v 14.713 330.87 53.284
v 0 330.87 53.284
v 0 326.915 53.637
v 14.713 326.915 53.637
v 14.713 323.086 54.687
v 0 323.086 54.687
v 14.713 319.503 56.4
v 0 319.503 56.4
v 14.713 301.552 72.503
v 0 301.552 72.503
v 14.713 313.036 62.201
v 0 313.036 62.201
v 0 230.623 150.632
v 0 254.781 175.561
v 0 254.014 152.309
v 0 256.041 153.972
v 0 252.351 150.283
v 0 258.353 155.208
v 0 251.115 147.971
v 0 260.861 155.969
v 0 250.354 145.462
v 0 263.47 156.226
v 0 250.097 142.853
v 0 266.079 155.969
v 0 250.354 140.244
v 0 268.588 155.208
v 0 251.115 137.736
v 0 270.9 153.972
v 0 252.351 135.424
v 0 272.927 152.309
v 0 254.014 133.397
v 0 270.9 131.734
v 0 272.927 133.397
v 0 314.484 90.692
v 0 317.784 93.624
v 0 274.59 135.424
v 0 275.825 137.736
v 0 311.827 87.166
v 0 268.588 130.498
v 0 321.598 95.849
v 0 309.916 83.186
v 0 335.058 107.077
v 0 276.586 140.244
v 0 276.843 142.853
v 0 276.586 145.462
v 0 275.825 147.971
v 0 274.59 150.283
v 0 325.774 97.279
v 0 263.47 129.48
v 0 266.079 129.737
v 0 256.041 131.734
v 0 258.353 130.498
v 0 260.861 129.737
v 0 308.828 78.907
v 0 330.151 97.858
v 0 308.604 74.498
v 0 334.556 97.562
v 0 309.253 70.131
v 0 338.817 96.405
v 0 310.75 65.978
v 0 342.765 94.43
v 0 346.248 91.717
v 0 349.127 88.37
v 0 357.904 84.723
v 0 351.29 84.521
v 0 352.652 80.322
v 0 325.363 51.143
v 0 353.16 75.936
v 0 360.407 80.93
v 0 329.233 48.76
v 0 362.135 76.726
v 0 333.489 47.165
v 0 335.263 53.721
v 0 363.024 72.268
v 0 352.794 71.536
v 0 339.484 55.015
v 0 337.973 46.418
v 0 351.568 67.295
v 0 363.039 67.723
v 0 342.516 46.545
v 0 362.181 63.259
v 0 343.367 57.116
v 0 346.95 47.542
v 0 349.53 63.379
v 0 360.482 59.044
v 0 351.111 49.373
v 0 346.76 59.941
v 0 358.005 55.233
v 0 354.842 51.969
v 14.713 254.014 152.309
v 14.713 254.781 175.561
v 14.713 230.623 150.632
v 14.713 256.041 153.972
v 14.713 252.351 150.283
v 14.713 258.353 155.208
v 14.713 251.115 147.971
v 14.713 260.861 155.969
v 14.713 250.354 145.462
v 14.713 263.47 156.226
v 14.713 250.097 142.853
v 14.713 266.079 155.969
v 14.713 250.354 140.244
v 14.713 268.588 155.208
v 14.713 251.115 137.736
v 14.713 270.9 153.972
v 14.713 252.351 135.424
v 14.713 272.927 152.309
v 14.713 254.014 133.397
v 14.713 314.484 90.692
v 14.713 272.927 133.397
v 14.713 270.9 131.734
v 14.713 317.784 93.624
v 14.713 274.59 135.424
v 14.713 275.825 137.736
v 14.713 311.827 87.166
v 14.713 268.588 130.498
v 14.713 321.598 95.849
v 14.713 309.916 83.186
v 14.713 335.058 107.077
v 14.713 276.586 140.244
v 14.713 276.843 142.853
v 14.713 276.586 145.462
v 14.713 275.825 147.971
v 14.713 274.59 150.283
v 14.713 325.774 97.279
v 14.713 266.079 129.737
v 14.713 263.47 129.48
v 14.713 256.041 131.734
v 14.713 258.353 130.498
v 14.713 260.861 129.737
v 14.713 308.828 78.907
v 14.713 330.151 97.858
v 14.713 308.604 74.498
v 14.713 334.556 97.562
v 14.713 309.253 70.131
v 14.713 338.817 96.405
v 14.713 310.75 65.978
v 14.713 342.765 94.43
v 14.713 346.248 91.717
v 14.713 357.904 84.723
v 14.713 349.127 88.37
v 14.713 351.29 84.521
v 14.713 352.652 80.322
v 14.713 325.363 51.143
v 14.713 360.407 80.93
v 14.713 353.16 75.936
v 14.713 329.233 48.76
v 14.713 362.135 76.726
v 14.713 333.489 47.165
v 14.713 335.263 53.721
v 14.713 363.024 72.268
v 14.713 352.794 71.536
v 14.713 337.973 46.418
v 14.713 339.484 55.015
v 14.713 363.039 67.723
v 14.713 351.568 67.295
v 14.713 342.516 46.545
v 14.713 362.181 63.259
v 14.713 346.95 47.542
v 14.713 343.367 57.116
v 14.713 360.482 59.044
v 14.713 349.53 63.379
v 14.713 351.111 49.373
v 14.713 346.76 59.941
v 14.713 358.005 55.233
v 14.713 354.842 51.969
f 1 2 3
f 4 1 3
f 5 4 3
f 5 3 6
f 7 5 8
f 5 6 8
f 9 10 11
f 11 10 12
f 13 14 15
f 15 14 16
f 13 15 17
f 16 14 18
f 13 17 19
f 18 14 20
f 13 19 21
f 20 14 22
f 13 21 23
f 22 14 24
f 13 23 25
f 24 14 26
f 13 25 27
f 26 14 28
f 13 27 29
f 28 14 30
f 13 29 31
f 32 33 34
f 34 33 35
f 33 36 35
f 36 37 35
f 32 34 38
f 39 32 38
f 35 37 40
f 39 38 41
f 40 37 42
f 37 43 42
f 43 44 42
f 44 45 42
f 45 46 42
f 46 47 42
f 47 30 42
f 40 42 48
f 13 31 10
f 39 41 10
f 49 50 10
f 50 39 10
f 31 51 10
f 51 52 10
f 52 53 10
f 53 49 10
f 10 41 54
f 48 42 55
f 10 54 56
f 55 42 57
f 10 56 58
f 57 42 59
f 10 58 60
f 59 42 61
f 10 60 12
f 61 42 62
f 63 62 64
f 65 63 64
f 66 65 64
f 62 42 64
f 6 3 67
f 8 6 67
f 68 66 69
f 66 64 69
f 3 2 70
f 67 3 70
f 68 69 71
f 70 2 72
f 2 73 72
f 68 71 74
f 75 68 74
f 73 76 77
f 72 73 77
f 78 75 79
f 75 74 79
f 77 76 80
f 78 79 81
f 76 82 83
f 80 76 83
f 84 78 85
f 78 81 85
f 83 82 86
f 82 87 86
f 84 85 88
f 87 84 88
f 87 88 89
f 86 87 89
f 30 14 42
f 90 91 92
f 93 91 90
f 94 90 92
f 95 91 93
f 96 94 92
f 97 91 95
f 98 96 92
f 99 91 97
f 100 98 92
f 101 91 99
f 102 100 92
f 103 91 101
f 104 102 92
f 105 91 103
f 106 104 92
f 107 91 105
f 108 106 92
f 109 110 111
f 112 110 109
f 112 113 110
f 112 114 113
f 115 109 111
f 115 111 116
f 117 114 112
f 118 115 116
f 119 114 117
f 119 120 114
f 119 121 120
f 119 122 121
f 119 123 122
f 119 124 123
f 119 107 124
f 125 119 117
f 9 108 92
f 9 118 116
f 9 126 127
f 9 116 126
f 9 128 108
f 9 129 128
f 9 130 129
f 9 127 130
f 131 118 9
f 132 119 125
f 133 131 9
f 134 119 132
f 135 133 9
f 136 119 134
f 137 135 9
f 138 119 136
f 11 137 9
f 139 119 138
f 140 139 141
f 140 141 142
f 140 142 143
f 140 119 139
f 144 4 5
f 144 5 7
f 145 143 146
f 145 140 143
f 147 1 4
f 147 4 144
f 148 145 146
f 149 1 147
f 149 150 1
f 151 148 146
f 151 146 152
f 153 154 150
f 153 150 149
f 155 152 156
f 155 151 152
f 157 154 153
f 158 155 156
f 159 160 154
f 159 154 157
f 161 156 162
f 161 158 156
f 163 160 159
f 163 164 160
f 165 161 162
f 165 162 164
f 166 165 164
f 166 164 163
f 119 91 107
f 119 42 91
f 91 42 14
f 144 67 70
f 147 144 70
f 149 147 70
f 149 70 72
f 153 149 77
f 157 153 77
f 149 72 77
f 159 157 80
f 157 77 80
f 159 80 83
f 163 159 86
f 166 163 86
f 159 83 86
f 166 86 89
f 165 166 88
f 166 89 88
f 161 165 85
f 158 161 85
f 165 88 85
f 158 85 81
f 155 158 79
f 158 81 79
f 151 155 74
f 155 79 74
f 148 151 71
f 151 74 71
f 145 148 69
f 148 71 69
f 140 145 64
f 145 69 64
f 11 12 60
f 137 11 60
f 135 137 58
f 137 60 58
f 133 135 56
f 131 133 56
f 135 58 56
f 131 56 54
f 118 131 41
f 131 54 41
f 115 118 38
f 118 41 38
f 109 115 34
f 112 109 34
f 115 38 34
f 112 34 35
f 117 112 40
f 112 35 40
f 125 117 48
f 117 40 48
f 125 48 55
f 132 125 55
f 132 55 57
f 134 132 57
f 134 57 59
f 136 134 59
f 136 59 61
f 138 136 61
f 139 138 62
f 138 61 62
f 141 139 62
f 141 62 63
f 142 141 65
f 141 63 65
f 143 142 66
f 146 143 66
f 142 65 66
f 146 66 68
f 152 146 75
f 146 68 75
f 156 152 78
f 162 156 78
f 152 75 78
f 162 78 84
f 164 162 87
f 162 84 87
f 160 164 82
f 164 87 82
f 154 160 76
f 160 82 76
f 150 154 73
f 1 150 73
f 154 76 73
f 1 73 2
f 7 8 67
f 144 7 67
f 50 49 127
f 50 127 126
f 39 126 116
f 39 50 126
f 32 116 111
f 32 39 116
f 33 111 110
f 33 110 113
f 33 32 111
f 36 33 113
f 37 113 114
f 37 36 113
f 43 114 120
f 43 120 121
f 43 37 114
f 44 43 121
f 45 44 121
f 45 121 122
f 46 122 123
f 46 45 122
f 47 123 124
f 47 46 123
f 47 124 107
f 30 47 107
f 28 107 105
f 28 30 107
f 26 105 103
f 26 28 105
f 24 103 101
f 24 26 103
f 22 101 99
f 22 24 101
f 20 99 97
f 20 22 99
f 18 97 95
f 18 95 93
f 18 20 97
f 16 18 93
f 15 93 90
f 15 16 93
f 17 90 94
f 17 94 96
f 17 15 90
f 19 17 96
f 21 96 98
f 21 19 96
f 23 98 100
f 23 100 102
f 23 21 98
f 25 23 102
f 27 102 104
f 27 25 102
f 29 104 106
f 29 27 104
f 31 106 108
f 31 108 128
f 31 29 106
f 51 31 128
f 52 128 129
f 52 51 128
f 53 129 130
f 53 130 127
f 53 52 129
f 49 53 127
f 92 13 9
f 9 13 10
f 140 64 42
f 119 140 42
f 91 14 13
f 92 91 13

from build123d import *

# Parameters (mm, degrees)
SKETCH1_R           = 13.372971861
BOSS_EXTRUDE1_DEPTH = 14.713458


with BuildPart() as part:
    # Sketch1 → Boss-Extrude1 (new body)
    with BuildSketch(Plane(origin=(0, 0, 0), x_dir=(0, 0, -1), z_dir=(1, 0, 0))):
        with BuildLine():
            Line((-107.077256, 335.05775), (-175.56099, 254.780796))
            Line((-175.56099, 254.780796), (-150.631652, 230.622856))
            Line((-150.631652, 230.622856), (-72.502522, 301.552356))
            Line((-72.502522, 301.552356), (-62.201011559, 313.03589653))
            ThreePointArc((-62.201011559, 313.03589653), (-95.515627855, 340.840078742), (-53.283651357, 330.870306))
            ThreePointArc((-53.283651357, 330.870306), (-54.076724145, 324.9770363), (-56.399514867, 319.50307654))
            Line((-56.399514867, 319.50307654), (-51.143154, 325.36257))
            ThreePointArc((-51.143154, 325.36257), (-53.524433804, 356.502187085), (-84.723478, 357.904288))
            Line((-84.723478, 357.904288), (-107.077256, 335.05775))
        make_face()
        with Locations((-142.853156, 263.47039)):
            Circle(SKETCH1_R, mode=Mode.SUBTRACT)
    extrude(amount=BOSS_EXTRUDE1_DEPTH)


solid = part.part
